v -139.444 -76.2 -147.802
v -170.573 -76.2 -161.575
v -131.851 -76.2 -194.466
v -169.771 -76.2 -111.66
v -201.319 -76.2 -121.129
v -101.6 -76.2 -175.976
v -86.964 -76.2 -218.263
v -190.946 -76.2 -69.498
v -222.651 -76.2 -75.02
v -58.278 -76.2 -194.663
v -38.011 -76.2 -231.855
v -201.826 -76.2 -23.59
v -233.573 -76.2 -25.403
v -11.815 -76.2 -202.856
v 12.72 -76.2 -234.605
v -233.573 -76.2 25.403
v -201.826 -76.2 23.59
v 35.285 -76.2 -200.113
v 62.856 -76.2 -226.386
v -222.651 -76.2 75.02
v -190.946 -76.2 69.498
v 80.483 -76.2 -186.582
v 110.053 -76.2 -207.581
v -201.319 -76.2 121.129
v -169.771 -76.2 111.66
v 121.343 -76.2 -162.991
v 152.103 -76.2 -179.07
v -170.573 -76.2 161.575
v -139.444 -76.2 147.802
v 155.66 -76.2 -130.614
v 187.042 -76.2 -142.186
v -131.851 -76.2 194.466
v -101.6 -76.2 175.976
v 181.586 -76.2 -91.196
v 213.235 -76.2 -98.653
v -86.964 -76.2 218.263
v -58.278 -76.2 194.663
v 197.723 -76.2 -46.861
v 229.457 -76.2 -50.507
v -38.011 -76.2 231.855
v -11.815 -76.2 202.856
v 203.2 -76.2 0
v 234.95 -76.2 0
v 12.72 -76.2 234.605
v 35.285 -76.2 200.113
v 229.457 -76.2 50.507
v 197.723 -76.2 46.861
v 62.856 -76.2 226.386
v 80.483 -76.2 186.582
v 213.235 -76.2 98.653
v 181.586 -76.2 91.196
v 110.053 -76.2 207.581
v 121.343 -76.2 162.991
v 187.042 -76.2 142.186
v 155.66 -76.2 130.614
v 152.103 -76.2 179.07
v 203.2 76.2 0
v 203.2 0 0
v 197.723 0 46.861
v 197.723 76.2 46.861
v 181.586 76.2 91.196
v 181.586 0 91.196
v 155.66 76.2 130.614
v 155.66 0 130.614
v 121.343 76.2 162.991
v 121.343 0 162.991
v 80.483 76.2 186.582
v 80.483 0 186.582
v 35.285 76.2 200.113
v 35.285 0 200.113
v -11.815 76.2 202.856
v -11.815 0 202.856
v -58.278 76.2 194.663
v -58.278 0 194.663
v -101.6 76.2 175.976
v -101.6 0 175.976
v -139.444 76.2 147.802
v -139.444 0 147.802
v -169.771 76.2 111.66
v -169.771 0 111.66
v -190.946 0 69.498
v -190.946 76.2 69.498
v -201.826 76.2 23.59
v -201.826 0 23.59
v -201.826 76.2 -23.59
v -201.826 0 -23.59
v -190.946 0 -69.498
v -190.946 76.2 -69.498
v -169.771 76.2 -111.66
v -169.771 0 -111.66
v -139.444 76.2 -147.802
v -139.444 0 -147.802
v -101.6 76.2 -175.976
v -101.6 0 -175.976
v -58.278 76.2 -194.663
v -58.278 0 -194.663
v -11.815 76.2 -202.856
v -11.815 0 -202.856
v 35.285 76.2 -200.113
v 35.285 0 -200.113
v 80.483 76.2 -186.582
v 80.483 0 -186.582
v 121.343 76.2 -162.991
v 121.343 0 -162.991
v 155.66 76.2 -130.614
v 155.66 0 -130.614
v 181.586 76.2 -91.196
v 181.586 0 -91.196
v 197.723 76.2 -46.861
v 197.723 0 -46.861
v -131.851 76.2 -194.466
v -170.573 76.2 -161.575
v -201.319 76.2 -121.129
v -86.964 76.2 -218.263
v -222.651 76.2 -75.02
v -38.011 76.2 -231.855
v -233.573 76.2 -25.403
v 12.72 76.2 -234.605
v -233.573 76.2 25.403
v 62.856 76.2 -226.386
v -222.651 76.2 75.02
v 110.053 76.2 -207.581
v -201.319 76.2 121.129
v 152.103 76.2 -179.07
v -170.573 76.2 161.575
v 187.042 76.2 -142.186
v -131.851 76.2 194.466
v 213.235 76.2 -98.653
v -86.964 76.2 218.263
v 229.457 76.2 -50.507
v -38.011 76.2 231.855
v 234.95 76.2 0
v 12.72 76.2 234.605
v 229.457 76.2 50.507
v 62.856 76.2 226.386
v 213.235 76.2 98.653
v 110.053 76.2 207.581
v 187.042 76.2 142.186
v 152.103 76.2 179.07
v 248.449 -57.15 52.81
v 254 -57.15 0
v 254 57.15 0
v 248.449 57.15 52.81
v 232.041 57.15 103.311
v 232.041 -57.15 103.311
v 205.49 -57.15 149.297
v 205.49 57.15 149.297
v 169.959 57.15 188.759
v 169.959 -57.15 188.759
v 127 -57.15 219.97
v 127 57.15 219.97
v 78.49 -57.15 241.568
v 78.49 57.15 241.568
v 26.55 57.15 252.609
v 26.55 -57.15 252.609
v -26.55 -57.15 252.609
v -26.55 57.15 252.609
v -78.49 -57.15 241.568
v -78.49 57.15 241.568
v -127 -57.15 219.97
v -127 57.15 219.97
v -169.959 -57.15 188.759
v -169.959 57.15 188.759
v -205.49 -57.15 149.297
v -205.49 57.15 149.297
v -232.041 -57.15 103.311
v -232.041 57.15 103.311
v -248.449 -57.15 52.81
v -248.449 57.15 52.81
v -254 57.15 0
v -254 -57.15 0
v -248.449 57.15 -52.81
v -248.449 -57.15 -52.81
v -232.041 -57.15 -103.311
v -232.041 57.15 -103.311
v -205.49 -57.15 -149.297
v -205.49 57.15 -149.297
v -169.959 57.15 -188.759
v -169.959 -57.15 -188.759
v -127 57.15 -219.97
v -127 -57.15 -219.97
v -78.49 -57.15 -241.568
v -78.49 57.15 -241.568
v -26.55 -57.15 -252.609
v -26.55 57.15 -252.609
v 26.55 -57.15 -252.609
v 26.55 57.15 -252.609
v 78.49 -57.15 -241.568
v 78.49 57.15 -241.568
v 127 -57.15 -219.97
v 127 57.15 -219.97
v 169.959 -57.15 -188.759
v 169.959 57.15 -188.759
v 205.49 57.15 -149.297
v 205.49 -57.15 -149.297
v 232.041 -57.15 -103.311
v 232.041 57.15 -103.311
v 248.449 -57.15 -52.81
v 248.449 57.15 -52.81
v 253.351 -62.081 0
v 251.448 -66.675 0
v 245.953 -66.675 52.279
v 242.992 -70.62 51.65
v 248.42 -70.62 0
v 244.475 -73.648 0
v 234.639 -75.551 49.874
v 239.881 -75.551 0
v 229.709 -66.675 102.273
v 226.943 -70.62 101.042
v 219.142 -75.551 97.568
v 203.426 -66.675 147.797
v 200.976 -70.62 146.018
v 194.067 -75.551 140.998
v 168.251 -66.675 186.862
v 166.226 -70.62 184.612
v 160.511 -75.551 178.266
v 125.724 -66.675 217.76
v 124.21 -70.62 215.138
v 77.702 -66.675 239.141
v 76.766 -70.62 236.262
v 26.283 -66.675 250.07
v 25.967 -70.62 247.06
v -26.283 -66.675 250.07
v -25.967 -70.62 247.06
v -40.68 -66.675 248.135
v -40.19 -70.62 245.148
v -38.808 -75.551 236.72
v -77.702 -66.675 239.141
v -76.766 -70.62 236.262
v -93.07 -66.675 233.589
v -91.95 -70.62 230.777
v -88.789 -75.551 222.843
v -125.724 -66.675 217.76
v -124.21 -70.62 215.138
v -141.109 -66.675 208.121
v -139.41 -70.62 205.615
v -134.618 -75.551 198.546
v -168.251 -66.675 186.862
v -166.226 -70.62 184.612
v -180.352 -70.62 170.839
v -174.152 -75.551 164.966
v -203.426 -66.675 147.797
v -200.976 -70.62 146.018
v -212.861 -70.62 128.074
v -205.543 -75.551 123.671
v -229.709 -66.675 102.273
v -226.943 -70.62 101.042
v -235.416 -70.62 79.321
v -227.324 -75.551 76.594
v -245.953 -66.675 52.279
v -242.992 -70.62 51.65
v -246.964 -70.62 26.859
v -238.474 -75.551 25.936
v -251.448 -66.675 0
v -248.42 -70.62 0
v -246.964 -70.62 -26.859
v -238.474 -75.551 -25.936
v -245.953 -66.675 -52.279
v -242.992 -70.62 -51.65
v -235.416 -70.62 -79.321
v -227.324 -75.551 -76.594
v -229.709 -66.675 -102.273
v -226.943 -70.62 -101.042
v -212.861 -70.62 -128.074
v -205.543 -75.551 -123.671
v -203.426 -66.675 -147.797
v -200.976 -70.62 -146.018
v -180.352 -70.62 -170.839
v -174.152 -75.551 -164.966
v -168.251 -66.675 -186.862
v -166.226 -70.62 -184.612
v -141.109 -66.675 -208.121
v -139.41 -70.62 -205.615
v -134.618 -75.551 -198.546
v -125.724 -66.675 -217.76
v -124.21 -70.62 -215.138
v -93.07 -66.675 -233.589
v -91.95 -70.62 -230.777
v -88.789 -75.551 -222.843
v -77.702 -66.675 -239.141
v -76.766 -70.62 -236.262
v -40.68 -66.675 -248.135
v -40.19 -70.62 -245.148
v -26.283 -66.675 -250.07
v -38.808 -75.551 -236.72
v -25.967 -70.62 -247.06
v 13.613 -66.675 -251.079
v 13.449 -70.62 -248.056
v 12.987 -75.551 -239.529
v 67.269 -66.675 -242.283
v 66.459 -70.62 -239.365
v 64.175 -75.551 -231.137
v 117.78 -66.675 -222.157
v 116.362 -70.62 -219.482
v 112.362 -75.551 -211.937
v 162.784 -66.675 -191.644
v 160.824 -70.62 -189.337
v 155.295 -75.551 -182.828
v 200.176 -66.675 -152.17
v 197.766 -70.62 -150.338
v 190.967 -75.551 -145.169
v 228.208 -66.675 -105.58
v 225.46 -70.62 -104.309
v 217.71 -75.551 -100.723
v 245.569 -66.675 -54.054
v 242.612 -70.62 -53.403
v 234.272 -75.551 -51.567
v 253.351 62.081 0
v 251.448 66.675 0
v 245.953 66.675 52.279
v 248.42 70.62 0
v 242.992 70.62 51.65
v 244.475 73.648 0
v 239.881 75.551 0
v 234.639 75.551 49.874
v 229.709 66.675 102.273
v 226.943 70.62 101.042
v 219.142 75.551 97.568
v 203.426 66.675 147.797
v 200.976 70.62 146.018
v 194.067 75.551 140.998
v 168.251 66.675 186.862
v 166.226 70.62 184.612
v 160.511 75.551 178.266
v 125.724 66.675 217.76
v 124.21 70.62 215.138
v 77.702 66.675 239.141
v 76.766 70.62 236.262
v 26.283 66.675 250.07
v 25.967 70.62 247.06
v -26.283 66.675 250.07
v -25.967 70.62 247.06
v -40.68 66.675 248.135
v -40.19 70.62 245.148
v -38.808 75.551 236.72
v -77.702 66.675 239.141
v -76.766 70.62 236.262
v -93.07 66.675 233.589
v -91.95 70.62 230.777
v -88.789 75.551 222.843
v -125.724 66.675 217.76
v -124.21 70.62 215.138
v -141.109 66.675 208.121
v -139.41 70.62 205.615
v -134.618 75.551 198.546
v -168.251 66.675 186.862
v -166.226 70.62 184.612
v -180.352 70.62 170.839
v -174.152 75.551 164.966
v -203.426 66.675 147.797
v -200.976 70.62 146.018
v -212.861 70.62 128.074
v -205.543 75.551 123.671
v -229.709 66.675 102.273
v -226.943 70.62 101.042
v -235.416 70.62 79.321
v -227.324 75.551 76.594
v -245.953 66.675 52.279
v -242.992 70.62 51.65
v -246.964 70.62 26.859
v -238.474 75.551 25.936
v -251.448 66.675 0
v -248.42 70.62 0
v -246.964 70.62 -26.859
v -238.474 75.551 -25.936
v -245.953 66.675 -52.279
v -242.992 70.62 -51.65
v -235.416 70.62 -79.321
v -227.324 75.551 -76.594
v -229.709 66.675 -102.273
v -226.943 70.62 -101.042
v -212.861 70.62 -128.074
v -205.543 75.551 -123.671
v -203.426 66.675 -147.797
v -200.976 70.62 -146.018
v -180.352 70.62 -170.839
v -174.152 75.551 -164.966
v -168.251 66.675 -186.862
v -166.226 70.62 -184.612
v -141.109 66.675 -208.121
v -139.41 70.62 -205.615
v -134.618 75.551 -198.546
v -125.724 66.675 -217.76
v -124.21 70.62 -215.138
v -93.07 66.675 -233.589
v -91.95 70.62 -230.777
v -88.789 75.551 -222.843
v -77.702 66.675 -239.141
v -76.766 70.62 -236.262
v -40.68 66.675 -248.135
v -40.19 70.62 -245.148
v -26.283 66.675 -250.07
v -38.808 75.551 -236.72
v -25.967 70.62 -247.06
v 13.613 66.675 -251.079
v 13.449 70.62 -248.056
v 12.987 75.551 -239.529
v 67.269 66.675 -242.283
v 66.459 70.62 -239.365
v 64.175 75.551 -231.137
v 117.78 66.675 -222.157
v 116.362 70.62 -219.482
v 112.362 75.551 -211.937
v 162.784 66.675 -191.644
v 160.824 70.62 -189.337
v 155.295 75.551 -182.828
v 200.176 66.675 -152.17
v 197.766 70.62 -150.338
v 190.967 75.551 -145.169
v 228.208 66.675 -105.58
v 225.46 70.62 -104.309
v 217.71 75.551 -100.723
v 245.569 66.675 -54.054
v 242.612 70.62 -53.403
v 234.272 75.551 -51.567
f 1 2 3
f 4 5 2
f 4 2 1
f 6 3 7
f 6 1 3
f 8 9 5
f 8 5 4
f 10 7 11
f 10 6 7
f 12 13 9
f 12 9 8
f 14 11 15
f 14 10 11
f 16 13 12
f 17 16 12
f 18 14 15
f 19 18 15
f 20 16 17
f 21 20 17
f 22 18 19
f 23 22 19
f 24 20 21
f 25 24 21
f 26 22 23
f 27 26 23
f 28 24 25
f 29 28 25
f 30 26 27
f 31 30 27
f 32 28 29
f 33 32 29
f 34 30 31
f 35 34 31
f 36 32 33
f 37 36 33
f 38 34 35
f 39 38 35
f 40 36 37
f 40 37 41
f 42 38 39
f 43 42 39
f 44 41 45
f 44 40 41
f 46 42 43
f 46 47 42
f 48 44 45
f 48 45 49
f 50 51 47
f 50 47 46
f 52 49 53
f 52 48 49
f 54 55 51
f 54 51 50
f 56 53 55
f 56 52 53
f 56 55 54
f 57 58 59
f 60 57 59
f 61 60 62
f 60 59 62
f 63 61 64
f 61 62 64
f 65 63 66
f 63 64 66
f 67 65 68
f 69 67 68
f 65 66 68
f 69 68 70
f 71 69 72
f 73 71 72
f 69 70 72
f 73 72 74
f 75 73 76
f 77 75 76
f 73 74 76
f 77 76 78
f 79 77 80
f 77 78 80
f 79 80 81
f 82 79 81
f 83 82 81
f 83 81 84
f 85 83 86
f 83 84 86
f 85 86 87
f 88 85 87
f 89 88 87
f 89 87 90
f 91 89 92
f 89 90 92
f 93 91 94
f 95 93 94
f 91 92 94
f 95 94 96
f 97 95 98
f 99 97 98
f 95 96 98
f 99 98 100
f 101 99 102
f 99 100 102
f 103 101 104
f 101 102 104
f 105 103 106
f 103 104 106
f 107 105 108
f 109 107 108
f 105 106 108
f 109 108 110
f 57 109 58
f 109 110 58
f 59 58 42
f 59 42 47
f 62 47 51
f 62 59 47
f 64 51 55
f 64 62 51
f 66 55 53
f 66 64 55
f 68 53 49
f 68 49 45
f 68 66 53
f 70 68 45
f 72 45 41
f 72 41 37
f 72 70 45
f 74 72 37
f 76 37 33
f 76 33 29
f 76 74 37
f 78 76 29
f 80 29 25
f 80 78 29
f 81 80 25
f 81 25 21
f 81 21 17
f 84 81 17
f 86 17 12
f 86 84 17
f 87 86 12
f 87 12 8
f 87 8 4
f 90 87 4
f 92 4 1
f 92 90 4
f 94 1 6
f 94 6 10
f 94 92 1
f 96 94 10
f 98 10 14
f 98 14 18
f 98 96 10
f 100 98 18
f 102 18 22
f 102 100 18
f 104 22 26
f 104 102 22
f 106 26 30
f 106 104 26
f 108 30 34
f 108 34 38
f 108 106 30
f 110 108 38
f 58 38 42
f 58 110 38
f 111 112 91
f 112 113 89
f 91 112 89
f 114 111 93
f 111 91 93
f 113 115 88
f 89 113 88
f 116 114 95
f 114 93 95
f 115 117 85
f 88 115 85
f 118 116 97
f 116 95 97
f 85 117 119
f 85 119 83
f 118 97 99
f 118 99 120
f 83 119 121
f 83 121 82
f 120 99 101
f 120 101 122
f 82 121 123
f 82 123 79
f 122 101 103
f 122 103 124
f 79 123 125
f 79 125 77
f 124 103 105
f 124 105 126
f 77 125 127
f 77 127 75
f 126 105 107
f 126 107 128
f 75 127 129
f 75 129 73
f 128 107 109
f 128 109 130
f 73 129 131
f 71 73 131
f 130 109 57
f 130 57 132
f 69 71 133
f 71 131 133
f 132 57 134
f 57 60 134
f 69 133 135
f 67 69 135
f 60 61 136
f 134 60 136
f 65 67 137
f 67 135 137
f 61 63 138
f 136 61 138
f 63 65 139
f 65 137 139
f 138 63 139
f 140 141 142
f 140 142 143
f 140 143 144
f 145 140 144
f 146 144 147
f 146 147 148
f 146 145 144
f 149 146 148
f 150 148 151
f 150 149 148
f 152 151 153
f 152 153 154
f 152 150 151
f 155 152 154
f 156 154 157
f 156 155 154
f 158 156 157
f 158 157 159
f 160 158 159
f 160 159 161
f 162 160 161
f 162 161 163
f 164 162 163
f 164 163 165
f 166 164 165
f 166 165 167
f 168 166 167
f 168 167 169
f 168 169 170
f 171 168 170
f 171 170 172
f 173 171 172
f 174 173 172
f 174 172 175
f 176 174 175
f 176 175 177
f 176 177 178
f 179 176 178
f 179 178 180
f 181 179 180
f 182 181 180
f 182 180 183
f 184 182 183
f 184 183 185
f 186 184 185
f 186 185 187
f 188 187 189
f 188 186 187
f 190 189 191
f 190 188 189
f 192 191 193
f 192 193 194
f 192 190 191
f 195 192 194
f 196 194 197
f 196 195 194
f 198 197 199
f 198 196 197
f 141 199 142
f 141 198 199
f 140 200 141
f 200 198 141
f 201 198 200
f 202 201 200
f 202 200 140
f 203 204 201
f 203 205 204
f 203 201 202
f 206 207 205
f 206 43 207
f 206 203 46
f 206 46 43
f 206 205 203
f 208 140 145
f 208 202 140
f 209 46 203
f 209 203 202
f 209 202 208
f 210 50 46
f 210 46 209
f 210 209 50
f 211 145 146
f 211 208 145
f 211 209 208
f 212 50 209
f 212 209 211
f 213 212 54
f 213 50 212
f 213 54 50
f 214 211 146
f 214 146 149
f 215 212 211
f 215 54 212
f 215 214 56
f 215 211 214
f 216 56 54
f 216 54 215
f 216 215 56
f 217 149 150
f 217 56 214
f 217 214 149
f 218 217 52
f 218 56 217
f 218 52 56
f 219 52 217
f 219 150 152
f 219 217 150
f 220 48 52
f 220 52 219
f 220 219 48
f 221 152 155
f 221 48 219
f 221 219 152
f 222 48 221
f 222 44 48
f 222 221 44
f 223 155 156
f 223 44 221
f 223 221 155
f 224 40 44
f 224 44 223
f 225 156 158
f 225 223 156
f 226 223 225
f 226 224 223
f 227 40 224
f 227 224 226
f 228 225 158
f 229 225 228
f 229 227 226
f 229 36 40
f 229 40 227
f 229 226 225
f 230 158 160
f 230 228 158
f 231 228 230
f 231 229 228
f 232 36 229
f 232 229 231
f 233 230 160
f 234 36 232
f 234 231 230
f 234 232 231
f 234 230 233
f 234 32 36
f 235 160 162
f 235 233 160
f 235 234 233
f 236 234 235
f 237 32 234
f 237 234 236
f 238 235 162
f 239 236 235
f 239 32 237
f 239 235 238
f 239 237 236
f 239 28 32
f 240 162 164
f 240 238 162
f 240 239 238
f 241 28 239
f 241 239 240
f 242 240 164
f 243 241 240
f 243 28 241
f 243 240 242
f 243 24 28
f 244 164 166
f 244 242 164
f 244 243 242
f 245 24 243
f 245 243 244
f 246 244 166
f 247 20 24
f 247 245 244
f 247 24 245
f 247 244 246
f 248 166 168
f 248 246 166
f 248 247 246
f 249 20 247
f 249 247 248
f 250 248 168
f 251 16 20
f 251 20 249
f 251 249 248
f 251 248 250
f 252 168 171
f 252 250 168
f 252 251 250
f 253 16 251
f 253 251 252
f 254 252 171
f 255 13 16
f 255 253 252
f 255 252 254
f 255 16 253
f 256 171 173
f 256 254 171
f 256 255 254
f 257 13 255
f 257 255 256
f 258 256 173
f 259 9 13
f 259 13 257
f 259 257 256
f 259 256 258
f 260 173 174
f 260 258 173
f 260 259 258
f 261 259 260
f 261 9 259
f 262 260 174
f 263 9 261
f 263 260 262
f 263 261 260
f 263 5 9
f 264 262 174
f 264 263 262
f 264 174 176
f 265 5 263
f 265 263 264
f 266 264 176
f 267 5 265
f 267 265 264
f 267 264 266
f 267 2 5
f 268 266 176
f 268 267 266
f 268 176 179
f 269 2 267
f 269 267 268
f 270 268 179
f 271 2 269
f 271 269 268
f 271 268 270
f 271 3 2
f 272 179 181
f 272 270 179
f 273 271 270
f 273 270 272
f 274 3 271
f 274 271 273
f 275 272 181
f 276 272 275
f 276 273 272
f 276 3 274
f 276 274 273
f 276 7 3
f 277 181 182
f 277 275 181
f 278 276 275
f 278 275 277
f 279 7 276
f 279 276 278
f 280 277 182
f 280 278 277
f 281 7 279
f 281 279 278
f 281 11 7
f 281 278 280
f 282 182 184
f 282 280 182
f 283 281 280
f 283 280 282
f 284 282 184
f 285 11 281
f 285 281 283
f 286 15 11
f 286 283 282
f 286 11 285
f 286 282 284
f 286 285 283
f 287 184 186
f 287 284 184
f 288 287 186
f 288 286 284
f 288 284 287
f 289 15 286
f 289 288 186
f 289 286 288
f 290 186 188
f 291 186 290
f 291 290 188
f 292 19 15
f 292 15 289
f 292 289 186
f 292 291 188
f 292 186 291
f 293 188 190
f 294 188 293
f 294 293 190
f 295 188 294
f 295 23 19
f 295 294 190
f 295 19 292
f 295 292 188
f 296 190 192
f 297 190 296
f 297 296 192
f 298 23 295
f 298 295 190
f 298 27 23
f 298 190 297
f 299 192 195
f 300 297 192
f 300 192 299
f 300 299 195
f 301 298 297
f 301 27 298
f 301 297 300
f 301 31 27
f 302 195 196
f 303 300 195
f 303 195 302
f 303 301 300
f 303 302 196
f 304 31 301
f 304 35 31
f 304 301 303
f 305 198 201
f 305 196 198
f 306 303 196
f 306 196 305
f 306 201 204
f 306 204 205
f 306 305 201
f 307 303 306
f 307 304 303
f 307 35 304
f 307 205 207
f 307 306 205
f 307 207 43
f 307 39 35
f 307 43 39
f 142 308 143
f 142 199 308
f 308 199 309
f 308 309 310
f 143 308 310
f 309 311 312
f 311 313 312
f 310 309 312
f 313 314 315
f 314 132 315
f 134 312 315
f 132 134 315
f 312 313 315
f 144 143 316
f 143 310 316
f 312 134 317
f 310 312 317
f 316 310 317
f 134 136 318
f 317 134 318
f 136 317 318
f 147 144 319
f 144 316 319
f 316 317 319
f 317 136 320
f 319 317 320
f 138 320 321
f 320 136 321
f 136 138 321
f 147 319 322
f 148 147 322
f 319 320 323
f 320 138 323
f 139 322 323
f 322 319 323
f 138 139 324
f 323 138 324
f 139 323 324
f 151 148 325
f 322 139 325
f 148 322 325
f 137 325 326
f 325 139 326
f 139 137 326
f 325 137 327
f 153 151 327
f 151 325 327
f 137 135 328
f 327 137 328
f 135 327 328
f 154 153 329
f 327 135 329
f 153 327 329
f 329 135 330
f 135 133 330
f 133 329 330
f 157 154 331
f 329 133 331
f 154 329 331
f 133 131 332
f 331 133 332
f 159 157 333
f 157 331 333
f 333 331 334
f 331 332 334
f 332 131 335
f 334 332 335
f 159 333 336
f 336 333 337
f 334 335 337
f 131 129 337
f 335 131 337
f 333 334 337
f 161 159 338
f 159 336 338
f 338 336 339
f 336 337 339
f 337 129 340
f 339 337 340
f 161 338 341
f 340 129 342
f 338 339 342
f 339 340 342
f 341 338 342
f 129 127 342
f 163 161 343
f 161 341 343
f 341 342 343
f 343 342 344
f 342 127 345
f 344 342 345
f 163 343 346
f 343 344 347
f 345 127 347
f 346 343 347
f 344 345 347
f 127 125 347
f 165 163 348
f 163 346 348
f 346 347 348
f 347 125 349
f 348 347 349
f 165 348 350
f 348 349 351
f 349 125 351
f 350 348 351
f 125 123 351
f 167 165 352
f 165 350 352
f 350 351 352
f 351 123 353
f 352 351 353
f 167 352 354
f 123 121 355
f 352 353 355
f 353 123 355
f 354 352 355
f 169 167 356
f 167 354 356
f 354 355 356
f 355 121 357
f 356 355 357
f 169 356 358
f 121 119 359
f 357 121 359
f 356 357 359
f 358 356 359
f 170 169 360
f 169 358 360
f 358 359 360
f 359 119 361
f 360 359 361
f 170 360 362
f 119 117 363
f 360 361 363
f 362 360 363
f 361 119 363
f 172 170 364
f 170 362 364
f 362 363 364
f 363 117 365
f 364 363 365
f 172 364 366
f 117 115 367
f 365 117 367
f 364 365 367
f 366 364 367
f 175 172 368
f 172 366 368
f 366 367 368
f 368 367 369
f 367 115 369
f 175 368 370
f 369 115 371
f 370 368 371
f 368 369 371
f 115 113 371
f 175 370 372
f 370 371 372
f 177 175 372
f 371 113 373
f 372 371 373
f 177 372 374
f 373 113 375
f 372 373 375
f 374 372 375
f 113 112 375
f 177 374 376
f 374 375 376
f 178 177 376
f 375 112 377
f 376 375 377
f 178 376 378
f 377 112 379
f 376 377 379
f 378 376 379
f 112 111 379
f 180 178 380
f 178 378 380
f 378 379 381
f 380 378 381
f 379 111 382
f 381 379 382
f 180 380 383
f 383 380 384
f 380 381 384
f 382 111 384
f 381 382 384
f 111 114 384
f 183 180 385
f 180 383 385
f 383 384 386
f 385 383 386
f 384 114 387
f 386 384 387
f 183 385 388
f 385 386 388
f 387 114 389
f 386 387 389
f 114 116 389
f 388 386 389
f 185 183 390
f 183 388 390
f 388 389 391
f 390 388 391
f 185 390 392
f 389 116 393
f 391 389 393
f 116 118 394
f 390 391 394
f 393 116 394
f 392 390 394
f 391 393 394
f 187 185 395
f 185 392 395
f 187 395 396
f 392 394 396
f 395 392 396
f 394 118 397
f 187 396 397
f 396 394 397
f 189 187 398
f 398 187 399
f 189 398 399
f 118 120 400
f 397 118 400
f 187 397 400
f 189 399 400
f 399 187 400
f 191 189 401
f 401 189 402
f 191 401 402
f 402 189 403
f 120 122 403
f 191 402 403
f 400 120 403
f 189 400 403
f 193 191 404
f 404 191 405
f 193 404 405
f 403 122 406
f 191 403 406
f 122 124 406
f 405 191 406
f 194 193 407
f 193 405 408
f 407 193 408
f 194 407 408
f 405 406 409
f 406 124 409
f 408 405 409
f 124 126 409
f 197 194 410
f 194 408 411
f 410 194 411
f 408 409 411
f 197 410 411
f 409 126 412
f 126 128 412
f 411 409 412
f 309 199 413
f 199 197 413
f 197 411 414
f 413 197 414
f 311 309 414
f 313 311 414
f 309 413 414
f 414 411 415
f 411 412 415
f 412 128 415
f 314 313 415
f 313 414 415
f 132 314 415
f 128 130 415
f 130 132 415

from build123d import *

# Parameters (mm, degrees)
F0_R          = 254
F0_R_2        = 203.2
F2_DEPTH      = 76.2
F2_DEPTH_BACK = 76.2
F3_R          = 19.05


# Not quite as in the source:
# - the program builds the solid bodies; features that only make, move or delete a surface that nothing else refers to are left out


with BuildPart() as f2:
    # F0 (on Front) → F2 (new body, two sides)
    with BuildSketch(Plane.XZ) as f2_sk:
        Circle(F0_R)
        Circle(F0_R_2, mode=Mode.SUBTRACT)
    extrude(amount=F2_DEPTH)
    extrude(f2_sk.sketch, amount=-F2_DEPTH_BACK)

    # F3
    f3_edges = [f2.edges().sort_by_distance(p)[0] for p in [
        (-254, 76.2, 0),
        (-254, -76.2, 0),
    ]]
    fillet(f3_edges, radius=F3_R)


solid = f2.part
